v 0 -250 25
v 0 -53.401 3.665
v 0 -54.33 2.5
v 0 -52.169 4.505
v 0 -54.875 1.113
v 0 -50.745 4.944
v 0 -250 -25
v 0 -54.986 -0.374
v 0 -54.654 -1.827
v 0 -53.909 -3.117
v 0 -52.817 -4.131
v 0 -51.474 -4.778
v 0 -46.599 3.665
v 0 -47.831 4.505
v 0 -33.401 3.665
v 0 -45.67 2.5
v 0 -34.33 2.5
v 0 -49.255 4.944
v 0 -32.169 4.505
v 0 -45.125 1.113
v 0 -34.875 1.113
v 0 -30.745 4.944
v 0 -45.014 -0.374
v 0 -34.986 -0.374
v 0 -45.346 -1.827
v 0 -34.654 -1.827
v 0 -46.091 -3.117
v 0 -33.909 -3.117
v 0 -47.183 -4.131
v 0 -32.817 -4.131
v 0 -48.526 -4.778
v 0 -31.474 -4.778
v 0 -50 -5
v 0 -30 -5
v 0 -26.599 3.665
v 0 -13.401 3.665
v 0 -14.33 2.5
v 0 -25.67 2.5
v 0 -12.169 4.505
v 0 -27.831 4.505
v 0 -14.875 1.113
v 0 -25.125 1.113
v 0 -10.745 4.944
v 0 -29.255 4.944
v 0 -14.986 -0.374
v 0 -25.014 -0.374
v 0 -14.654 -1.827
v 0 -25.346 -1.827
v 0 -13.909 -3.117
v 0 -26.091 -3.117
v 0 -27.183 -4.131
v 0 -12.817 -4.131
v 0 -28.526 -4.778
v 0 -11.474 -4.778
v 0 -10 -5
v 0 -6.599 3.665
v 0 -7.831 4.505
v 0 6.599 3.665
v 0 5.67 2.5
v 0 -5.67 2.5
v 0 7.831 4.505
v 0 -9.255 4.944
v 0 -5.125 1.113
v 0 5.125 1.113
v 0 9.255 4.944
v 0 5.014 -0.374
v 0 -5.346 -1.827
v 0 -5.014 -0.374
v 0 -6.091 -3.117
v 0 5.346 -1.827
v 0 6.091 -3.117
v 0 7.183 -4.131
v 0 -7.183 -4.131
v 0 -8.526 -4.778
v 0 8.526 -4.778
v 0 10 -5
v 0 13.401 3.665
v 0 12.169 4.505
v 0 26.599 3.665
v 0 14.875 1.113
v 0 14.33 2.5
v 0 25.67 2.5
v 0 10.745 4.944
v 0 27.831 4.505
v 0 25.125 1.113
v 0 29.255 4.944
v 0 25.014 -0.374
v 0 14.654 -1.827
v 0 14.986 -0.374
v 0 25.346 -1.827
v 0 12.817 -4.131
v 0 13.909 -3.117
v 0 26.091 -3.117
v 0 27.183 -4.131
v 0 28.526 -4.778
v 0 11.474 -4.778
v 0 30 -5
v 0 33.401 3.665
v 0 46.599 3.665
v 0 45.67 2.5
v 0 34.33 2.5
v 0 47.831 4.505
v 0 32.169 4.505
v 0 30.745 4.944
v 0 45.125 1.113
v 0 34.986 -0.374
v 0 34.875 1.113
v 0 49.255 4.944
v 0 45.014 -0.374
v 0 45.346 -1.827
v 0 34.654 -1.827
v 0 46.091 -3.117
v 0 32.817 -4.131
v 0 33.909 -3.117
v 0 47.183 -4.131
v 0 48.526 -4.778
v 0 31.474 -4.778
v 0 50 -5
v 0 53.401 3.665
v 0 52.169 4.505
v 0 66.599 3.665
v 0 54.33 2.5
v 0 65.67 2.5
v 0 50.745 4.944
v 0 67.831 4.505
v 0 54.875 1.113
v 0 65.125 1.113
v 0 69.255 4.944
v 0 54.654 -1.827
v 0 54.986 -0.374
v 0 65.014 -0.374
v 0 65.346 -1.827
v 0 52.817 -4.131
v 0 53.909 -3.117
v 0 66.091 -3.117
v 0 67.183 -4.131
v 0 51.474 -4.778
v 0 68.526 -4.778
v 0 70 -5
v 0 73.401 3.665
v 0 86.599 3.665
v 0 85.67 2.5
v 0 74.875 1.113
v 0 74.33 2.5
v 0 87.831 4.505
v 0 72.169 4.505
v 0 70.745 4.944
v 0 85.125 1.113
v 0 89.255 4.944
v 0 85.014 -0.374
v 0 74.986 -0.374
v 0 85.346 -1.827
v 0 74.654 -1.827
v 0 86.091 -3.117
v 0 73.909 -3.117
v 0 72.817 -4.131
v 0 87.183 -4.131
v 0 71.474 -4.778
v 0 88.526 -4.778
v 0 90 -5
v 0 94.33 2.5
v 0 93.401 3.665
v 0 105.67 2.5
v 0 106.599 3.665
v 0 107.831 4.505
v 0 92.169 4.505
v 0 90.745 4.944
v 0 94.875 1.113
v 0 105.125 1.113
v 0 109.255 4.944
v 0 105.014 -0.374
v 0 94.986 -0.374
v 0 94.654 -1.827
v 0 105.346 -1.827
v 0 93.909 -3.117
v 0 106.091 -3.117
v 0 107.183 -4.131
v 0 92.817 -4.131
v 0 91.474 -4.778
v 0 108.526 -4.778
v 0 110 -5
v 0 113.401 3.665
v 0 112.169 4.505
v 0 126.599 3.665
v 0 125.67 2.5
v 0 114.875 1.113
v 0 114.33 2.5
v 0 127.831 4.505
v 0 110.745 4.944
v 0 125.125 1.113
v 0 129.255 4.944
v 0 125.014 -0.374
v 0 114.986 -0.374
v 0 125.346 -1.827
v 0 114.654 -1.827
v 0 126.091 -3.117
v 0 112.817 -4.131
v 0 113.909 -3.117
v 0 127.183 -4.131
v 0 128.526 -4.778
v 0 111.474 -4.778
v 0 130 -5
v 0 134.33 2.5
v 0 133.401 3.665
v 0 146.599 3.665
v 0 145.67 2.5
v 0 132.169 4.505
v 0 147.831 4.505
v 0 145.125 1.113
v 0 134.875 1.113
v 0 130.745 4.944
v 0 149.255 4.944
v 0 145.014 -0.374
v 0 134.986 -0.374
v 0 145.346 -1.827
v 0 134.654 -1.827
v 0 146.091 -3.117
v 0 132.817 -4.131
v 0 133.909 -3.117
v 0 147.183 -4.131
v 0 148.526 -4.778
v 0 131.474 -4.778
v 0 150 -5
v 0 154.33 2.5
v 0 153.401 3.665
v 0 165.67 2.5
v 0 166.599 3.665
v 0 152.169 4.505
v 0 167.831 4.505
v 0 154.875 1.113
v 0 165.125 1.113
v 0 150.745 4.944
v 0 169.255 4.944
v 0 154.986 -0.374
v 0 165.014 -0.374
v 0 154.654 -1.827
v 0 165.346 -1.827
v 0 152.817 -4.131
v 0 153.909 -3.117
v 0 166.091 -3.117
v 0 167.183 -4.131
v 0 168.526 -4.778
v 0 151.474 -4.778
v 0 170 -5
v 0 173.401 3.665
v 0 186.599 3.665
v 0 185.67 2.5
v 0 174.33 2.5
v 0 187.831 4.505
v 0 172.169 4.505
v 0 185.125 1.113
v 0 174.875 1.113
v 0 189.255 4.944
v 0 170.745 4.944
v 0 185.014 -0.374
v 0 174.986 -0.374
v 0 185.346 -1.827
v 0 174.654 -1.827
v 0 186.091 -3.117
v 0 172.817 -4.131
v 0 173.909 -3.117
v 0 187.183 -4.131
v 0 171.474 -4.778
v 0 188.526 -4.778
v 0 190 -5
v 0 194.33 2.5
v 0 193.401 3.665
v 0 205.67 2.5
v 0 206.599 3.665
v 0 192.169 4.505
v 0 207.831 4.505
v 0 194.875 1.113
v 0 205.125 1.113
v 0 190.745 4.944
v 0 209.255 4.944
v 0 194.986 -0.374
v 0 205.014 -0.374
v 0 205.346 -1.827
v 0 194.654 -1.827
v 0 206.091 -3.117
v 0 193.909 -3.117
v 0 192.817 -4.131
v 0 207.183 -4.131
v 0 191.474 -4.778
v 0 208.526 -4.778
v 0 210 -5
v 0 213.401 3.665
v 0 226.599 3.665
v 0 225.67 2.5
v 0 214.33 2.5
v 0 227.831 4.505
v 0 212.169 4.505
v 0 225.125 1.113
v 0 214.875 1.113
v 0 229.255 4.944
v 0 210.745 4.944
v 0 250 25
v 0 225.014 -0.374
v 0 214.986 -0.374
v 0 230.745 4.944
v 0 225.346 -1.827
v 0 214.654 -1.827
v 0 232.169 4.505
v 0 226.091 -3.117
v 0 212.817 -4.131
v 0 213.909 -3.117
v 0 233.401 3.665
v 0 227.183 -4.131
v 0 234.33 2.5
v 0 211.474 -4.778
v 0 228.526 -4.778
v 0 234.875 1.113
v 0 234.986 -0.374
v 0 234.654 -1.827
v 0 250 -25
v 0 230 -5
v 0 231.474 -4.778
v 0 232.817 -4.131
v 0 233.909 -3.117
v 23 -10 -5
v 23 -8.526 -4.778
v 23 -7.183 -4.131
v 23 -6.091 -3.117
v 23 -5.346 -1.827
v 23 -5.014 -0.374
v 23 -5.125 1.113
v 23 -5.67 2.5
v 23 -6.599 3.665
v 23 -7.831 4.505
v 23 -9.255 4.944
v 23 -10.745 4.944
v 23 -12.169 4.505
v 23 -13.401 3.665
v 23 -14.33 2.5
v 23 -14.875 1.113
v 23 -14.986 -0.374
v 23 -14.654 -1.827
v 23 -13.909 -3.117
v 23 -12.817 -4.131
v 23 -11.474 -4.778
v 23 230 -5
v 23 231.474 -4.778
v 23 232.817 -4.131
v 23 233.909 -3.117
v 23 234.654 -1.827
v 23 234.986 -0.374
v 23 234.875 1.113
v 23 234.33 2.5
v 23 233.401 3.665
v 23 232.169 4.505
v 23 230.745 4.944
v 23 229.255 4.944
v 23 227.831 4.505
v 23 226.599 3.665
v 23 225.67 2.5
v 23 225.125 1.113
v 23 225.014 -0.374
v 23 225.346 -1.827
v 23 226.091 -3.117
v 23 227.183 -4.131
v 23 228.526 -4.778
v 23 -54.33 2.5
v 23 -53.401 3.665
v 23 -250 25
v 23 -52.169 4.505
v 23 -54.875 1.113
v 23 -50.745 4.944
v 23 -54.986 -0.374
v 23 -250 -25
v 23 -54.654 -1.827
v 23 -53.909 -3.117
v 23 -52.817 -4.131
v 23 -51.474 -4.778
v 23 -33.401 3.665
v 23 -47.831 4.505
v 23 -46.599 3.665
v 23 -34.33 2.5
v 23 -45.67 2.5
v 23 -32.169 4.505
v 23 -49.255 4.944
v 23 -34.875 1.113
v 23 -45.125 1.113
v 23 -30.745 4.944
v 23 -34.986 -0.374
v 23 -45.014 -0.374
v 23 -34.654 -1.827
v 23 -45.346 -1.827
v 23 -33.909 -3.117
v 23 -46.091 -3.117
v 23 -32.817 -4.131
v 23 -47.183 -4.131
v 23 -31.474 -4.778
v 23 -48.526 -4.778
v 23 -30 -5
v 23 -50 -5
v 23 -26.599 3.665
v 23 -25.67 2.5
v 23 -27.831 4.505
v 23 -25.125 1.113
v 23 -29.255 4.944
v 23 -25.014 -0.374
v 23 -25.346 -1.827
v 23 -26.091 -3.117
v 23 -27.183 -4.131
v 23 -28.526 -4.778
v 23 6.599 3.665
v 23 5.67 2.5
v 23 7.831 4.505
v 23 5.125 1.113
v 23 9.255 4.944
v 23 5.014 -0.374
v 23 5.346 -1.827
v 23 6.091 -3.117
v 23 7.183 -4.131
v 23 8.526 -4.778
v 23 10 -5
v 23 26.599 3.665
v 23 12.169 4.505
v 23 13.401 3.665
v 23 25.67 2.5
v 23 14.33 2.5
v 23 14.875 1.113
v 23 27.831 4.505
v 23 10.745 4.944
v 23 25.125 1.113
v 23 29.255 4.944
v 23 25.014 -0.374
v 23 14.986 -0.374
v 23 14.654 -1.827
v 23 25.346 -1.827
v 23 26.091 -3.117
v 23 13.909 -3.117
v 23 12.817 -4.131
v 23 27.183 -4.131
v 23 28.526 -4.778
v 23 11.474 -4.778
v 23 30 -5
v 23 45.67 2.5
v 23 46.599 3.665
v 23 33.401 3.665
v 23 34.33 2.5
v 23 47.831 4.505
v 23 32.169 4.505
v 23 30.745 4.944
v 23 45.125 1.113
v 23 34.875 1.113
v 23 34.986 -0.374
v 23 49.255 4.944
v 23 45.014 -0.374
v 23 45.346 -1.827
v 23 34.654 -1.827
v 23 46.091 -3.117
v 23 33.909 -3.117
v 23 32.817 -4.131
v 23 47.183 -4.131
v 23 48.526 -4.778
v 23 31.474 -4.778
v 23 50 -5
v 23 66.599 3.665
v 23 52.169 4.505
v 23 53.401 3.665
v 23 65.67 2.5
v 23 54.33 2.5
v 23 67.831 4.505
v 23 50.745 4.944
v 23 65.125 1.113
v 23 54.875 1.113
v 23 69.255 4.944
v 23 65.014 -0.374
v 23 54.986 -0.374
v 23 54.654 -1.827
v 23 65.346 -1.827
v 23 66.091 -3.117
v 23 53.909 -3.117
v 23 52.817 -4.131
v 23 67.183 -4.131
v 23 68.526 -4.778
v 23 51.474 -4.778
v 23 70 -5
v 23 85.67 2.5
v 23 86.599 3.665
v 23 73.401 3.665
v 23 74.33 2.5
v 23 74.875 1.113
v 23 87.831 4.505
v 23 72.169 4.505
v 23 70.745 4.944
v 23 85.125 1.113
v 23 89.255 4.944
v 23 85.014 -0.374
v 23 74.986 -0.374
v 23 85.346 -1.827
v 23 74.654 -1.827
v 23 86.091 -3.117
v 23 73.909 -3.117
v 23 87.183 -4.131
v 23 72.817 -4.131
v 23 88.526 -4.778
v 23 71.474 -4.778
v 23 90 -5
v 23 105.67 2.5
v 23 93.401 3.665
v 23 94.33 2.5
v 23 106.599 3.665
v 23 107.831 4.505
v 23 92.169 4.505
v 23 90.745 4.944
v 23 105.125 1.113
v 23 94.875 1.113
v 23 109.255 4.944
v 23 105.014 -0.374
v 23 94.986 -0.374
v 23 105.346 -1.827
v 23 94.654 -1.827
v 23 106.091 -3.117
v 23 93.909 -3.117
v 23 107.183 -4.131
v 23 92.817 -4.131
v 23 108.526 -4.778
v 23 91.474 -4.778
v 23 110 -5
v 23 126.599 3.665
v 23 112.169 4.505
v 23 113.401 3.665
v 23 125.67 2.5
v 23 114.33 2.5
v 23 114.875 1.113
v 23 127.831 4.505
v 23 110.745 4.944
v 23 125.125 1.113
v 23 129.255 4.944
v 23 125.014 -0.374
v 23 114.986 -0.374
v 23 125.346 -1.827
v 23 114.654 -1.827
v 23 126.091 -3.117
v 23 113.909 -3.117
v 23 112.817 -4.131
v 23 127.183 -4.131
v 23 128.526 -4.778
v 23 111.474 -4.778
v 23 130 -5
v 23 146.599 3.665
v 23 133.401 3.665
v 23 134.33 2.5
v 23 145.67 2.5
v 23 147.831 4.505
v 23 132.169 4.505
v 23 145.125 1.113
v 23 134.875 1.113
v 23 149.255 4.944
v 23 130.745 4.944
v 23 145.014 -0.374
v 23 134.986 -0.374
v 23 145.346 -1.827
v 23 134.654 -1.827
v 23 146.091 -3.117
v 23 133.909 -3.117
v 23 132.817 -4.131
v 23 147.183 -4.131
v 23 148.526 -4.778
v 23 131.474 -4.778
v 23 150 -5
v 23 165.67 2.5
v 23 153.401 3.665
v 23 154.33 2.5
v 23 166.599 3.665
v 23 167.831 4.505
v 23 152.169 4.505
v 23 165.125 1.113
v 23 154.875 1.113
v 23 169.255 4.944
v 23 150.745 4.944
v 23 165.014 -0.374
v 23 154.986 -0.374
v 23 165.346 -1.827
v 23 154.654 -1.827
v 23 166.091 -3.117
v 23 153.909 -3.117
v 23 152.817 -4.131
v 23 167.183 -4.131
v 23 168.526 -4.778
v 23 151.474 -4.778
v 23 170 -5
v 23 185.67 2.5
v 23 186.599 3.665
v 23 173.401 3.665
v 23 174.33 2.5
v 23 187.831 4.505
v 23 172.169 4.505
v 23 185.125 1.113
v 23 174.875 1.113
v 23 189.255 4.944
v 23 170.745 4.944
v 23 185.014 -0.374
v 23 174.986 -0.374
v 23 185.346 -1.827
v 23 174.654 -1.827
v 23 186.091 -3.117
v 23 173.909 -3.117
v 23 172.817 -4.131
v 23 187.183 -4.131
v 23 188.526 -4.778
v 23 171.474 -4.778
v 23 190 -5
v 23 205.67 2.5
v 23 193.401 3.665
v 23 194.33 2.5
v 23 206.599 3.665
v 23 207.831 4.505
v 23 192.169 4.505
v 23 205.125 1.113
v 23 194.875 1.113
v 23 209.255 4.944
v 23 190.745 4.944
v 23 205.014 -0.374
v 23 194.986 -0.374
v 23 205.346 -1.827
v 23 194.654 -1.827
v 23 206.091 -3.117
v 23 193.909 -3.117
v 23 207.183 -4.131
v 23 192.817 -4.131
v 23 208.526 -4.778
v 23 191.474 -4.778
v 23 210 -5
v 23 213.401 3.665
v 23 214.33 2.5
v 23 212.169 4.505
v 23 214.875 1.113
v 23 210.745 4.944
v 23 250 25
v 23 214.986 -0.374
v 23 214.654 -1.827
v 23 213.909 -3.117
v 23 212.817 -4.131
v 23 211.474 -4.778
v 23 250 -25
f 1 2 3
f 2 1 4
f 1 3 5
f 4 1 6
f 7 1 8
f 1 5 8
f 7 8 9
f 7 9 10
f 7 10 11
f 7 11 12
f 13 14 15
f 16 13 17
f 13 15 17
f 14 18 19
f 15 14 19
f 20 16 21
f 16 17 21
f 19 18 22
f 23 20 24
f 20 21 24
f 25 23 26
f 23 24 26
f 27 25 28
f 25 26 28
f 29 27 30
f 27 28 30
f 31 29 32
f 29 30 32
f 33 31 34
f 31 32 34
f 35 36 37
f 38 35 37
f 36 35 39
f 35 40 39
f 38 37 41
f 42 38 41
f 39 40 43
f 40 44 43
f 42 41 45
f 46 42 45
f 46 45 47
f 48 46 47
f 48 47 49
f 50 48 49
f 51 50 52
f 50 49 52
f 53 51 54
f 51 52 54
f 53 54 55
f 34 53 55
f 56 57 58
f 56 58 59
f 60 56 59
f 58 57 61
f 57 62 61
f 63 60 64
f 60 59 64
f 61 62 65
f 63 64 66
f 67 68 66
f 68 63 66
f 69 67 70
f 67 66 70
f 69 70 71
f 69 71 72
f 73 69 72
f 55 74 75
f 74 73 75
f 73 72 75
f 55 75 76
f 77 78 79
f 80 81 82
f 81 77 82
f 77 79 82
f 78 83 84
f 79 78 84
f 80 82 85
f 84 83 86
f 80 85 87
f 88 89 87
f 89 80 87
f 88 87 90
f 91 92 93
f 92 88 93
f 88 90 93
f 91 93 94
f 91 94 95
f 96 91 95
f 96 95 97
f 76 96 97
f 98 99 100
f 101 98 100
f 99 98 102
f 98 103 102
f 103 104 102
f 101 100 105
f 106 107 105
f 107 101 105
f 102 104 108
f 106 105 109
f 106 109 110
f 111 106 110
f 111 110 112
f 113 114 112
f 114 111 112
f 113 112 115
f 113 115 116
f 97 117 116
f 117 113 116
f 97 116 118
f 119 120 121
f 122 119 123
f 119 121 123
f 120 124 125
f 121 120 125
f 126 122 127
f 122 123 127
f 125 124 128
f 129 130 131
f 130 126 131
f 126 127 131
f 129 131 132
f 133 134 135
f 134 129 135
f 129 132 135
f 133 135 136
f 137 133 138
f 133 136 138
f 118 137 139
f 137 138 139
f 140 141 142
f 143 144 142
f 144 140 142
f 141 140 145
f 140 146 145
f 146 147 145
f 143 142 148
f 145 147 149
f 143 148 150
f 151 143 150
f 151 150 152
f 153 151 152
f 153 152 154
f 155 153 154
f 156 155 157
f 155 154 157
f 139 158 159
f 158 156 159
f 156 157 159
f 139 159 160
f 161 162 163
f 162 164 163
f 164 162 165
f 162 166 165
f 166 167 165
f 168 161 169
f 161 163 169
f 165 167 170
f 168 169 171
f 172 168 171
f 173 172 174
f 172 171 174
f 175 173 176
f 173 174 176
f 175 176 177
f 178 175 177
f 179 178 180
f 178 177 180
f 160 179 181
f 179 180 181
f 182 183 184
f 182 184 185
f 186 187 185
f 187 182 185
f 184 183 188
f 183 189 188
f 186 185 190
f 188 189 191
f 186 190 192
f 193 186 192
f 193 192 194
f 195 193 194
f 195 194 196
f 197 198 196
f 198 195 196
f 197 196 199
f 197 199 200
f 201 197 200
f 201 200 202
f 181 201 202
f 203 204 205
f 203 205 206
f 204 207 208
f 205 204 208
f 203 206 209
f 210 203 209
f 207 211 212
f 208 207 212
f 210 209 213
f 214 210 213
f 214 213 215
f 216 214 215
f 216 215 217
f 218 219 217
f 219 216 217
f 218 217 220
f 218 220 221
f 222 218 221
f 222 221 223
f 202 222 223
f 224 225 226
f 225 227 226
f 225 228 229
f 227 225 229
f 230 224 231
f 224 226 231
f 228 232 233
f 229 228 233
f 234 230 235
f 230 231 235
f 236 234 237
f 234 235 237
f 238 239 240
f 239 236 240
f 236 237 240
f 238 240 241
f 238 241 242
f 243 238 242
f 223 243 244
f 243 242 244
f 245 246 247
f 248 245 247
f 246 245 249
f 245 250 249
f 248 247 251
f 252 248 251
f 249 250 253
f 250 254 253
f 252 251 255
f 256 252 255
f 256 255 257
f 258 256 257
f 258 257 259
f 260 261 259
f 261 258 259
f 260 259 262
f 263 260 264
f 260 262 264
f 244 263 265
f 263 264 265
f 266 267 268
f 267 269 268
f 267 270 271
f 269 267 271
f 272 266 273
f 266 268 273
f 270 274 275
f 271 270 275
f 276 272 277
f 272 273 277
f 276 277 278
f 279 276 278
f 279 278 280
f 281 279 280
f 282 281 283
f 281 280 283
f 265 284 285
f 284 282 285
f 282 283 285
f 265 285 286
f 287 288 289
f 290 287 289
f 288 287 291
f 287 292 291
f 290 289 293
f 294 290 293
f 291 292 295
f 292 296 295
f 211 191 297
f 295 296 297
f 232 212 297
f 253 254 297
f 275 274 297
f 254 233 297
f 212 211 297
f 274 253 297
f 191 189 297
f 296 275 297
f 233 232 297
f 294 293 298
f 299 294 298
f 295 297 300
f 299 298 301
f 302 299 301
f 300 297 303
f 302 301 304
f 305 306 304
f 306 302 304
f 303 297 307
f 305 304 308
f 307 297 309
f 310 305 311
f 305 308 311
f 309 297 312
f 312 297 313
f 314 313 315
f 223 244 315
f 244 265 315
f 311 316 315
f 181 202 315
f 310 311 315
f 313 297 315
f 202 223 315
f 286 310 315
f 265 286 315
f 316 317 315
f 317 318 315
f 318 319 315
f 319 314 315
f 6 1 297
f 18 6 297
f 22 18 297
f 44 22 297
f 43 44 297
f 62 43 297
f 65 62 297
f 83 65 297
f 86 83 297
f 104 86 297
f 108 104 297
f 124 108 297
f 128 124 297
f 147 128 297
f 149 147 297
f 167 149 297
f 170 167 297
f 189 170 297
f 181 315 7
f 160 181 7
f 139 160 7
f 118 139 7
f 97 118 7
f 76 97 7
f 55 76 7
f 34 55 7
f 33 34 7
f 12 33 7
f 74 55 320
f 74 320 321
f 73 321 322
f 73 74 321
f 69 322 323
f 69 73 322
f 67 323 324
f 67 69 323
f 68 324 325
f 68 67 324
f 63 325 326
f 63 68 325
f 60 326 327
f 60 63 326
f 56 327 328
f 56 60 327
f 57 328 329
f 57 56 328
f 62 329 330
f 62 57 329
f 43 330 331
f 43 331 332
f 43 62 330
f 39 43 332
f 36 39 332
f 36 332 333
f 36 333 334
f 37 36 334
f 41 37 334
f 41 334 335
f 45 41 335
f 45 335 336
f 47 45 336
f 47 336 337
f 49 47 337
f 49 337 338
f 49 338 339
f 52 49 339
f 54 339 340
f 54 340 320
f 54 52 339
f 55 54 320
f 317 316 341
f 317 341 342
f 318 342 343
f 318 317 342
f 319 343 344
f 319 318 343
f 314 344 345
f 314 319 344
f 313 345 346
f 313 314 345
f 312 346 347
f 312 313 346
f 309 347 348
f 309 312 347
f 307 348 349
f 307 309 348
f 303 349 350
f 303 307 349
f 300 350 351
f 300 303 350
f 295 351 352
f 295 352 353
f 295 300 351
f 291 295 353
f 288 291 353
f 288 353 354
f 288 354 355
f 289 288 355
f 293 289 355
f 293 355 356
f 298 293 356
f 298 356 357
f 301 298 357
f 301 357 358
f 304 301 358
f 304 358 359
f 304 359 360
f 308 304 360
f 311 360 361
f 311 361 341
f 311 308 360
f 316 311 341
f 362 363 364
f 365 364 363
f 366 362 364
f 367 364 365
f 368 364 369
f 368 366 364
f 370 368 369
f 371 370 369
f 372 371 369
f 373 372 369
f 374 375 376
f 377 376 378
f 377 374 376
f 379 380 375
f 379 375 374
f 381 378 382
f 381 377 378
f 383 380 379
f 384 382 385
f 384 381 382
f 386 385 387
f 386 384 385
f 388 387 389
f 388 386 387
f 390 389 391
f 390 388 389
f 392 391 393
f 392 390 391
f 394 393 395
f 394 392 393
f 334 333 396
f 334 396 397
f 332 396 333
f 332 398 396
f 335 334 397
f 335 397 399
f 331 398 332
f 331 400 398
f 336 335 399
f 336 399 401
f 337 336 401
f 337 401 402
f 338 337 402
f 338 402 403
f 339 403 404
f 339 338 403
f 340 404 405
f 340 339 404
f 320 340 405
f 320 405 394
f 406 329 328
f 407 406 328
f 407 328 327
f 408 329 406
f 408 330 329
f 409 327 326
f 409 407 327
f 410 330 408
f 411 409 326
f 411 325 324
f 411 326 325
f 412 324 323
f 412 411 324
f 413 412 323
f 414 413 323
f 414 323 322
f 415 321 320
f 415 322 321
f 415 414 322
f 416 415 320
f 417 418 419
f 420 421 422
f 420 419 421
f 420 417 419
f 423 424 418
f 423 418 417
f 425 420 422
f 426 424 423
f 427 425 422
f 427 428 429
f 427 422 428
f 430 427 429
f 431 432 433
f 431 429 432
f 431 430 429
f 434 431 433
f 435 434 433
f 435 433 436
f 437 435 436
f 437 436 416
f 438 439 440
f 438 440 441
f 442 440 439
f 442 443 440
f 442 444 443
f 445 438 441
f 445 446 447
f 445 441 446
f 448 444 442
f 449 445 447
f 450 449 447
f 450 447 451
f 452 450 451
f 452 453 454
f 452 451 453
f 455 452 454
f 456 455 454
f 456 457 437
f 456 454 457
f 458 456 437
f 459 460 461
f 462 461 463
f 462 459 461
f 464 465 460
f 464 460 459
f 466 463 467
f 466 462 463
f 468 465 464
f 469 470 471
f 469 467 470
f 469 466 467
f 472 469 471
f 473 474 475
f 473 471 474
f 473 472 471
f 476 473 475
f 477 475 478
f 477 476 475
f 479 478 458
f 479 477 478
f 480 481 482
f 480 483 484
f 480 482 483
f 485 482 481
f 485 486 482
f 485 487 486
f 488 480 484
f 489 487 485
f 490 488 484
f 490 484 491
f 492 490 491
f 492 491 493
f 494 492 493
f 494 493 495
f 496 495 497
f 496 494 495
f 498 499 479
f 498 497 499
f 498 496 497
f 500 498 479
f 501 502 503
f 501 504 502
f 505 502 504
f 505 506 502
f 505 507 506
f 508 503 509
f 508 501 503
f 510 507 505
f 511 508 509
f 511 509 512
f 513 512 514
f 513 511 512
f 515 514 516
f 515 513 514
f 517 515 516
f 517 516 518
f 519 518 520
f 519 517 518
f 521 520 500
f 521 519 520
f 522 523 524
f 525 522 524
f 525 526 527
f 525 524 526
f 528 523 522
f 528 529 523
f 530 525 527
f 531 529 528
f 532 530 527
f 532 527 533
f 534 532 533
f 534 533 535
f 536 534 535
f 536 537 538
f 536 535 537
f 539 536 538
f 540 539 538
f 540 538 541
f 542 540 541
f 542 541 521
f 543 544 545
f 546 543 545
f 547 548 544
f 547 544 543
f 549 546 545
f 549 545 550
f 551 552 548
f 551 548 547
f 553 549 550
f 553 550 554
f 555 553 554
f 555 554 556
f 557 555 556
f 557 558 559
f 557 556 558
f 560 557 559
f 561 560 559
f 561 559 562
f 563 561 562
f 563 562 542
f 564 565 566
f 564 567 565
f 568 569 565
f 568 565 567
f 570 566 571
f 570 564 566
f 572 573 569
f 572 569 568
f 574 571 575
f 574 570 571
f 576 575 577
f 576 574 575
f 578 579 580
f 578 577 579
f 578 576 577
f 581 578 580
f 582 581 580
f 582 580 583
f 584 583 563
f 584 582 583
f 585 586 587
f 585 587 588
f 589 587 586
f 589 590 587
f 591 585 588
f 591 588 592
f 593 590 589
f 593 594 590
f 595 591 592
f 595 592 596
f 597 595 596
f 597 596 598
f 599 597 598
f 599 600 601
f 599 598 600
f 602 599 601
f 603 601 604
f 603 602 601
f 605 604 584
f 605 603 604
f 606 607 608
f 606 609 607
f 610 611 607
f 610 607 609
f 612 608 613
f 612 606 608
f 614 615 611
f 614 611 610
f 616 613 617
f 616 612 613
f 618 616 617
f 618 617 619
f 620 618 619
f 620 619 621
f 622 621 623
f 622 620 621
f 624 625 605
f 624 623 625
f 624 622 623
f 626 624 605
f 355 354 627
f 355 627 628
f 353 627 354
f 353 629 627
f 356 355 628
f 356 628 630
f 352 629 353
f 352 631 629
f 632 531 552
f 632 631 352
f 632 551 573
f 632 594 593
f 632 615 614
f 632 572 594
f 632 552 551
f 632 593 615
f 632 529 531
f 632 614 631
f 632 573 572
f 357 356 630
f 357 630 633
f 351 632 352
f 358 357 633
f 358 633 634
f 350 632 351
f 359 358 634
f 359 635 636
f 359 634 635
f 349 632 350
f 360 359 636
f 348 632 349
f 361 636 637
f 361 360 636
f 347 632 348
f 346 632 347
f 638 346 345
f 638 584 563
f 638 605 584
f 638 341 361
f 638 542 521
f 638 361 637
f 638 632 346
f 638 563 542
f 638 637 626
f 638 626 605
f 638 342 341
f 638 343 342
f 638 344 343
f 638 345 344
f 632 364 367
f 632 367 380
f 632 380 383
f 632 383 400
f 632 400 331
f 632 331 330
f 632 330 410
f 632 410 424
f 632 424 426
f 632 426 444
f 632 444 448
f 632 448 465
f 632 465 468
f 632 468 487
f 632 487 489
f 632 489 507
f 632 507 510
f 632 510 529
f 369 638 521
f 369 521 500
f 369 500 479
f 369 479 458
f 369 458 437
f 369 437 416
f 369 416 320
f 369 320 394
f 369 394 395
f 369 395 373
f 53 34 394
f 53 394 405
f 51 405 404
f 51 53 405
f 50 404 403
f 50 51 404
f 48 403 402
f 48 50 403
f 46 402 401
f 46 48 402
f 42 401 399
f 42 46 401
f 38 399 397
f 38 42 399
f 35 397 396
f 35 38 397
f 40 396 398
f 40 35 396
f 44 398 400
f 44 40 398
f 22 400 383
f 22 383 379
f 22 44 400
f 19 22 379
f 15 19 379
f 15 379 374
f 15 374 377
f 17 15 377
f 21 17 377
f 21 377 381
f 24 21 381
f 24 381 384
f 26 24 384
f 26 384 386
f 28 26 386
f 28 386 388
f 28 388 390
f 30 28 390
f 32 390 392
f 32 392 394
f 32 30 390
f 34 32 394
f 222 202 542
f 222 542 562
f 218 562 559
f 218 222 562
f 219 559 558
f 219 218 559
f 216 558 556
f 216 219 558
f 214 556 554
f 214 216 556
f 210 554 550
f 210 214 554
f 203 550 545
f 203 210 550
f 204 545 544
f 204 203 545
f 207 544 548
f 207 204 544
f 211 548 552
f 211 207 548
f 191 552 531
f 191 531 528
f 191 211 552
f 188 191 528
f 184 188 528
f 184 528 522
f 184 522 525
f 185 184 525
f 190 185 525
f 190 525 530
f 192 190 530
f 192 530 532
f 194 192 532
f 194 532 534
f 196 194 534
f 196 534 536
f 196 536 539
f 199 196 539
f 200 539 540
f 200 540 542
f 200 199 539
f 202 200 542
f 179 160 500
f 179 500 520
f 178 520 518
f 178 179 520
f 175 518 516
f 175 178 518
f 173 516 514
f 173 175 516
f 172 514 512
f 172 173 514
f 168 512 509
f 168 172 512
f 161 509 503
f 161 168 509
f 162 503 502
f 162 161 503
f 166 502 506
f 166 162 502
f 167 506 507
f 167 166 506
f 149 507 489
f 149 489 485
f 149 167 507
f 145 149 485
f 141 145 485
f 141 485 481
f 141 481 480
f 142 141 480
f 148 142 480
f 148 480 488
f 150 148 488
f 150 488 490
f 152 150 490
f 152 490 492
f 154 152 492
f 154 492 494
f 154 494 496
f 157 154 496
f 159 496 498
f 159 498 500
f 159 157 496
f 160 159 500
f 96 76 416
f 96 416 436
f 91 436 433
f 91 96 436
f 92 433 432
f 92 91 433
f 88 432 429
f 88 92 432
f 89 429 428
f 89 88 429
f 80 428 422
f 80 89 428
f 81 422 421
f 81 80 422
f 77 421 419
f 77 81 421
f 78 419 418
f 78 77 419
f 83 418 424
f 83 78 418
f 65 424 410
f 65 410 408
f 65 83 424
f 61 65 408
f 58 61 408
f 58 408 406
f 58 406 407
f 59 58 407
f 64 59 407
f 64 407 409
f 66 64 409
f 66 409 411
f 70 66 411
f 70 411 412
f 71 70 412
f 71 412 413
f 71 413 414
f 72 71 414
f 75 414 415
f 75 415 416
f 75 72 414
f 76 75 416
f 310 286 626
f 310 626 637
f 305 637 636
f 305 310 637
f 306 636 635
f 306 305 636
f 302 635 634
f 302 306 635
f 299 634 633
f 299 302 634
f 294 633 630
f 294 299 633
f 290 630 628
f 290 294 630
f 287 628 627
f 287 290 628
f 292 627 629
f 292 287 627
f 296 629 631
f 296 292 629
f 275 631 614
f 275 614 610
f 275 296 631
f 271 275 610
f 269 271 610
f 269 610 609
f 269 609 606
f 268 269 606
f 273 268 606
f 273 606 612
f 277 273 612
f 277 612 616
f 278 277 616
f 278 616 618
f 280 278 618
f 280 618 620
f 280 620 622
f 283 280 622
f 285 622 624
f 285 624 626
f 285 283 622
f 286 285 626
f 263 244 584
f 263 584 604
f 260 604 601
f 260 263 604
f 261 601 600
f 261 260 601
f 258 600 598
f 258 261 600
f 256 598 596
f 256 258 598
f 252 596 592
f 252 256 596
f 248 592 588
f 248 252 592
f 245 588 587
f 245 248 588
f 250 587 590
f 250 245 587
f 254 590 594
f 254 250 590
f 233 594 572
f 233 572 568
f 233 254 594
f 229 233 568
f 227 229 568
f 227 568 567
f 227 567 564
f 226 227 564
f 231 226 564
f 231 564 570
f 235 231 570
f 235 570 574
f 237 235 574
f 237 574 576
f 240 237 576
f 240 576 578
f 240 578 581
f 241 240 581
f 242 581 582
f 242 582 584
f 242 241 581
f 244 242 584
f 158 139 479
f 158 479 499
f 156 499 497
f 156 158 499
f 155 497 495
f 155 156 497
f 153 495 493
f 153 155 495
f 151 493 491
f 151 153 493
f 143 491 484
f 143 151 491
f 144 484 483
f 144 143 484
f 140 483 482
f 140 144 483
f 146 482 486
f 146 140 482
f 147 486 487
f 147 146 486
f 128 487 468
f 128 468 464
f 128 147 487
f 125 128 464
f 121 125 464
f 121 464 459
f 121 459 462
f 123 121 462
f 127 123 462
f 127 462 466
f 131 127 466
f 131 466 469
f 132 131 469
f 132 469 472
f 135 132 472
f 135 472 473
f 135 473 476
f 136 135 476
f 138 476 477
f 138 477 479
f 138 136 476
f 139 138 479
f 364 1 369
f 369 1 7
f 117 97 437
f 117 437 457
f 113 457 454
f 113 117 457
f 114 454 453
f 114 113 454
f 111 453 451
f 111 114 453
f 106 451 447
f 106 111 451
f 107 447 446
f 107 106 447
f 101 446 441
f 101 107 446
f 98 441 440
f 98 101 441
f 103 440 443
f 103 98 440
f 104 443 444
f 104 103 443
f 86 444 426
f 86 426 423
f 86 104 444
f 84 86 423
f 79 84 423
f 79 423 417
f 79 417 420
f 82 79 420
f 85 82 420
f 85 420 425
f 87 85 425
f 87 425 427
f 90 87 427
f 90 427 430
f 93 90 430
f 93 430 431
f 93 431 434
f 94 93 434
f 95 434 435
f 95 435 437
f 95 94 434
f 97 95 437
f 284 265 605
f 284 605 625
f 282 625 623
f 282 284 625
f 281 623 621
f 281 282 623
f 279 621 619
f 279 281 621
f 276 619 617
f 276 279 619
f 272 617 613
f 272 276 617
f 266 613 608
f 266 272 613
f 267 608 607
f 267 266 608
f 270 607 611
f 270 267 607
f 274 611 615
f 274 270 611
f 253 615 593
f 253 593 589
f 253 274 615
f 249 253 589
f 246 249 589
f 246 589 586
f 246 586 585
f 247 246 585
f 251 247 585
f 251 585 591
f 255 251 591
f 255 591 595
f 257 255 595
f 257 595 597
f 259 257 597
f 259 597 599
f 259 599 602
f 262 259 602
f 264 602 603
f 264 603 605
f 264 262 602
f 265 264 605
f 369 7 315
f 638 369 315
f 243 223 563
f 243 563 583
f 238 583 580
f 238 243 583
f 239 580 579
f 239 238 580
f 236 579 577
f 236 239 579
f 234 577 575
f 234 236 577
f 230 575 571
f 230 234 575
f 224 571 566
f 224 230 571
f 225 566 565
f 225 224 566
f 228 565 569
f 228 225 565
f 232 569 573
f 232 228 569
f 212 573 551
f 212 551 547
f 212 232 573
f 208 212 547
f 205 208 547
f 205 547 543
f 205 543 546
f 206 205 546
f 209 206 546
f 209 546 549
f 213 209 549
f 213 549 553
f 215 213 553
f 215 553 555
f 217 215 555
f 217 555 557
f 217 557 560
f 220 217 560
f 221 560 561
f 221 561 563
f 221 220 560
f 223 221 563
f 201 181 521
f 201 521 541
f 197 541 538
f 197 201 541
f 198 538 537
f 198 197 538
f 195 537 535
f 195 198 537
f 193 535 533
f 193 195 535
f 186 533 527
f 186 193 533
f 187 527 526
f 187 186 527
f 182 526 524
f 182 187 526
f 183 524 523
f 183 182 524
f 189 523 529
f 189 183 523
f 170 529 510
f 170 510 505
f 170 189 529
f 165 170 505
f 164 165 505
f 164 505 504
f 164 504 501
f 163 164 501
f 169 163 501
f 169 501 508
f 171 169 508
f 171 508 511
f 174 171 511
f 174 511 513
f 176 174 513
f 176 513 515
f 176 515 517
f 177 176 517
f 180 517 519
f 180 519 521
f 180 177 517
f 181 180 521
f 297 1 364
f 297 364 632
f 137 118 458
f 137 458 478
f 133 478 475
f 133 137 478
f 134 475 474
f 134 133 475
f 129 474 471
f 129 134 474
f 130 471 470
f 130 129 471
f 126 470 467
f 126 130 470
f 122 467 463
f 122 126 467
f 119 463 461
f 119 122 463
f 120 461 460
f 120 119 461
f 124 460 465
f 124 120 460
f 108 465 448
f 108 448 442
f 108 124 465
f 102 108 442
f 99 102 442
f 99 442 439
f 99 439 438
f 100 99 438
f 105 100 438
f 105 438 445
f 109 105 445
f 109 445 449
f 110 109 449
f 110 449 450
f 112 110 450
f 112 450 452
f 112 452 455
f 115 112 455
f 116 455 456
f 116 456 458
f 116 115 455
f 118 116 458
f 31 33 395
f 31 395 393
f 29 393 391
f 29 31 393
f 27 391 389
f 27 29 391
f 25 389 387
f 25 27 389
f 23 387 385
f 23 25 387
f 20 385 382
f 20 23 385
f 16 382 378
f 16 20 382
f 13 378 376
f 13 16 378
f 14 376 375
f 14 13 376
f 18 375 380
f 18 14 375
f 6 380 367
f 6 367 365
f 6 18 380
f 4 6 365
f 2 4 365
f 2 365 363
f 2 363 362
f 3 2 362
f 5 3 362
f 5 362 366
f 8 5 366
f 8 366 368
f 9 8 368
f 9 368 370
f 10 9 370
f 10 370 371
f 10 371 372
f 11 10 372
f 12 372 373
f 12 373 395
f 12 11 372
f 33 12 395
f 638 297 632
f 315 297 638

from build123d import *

# Parameters (mm, degrees)
SKETCH1_W           = 50
SKETCH1_H           = 500
SKETCH1_R           = 5
BOSS_EXTRUDE1_DEPTH = 23


with BuildPart() as part:
    # Sketch1 → Boss-Extrude1 (new body)
    with BuildSketch(Plane(origin=(0, 0, 0), x_dir=(0, 0, -1), z_dir=(1, 0, 0))):
        Rectangle(SKETCH1_W, SKETCH1_H)
        with Locations((0, 230)):
            Circle(SKETCH1_R, mode=Mode.SUBTRACT)
        with Locations((0, 210)):
            Circle(SKETCH1_R, mode=Mode.SUBTRACT)
        with Locations((0, 190)):
            Circle(SKETCH1_R, mode=Mode.SUBTRACT)
        with Locations((0, 170)):
            Circle(SKETCH1_R, mode=Mode.SUBTRACT)
        with Locations((0, 150)):
            Circle(SKETCH1_R, mode=Mode.SUBTRACT)
        with Locations((0, 130)):
            Circle(SKETCH1_R, mode=Mode.SUBTRACT)
        with Locations((0, 110)):
            Circle(SKETCH1_R, mode=Mode.SUBTRACT)
        with Locations((0, 90)):
            Circle(SKETCH1_R, mode=Mode.SUBTRACT)
        with Locations((0, 70)):
            Circle(SKETCH1_R, mode=Mode.SUBTRACT)
        with Locations((0, 50)):
            Circle(SKETCH1_R, mode=Mode.SUBTRACT)
        with Locations((0, 30)):
            Circle(SKETCH1_R, mode=Mode.SUBTRACT)
        with Locations((0, 10)):
            Circle(SKETCH1_R, mode=Mode.SUBTRACT)
        with Locations((0, -10)):
            Circle(SKETCH1_R, mode=Mode.SUBTRACT)
        with Locations((0, -30)):
            Circle(SKETCH1_R, mode=Mode.SUBTRACT)
        with Locations((0, -50)):
            Circle(SKETCH1_R, mode=Mode.SUBTRACT)
    extrude(amount=BOSS_EXTRUDE1_DEPTH)


solid = part.part
